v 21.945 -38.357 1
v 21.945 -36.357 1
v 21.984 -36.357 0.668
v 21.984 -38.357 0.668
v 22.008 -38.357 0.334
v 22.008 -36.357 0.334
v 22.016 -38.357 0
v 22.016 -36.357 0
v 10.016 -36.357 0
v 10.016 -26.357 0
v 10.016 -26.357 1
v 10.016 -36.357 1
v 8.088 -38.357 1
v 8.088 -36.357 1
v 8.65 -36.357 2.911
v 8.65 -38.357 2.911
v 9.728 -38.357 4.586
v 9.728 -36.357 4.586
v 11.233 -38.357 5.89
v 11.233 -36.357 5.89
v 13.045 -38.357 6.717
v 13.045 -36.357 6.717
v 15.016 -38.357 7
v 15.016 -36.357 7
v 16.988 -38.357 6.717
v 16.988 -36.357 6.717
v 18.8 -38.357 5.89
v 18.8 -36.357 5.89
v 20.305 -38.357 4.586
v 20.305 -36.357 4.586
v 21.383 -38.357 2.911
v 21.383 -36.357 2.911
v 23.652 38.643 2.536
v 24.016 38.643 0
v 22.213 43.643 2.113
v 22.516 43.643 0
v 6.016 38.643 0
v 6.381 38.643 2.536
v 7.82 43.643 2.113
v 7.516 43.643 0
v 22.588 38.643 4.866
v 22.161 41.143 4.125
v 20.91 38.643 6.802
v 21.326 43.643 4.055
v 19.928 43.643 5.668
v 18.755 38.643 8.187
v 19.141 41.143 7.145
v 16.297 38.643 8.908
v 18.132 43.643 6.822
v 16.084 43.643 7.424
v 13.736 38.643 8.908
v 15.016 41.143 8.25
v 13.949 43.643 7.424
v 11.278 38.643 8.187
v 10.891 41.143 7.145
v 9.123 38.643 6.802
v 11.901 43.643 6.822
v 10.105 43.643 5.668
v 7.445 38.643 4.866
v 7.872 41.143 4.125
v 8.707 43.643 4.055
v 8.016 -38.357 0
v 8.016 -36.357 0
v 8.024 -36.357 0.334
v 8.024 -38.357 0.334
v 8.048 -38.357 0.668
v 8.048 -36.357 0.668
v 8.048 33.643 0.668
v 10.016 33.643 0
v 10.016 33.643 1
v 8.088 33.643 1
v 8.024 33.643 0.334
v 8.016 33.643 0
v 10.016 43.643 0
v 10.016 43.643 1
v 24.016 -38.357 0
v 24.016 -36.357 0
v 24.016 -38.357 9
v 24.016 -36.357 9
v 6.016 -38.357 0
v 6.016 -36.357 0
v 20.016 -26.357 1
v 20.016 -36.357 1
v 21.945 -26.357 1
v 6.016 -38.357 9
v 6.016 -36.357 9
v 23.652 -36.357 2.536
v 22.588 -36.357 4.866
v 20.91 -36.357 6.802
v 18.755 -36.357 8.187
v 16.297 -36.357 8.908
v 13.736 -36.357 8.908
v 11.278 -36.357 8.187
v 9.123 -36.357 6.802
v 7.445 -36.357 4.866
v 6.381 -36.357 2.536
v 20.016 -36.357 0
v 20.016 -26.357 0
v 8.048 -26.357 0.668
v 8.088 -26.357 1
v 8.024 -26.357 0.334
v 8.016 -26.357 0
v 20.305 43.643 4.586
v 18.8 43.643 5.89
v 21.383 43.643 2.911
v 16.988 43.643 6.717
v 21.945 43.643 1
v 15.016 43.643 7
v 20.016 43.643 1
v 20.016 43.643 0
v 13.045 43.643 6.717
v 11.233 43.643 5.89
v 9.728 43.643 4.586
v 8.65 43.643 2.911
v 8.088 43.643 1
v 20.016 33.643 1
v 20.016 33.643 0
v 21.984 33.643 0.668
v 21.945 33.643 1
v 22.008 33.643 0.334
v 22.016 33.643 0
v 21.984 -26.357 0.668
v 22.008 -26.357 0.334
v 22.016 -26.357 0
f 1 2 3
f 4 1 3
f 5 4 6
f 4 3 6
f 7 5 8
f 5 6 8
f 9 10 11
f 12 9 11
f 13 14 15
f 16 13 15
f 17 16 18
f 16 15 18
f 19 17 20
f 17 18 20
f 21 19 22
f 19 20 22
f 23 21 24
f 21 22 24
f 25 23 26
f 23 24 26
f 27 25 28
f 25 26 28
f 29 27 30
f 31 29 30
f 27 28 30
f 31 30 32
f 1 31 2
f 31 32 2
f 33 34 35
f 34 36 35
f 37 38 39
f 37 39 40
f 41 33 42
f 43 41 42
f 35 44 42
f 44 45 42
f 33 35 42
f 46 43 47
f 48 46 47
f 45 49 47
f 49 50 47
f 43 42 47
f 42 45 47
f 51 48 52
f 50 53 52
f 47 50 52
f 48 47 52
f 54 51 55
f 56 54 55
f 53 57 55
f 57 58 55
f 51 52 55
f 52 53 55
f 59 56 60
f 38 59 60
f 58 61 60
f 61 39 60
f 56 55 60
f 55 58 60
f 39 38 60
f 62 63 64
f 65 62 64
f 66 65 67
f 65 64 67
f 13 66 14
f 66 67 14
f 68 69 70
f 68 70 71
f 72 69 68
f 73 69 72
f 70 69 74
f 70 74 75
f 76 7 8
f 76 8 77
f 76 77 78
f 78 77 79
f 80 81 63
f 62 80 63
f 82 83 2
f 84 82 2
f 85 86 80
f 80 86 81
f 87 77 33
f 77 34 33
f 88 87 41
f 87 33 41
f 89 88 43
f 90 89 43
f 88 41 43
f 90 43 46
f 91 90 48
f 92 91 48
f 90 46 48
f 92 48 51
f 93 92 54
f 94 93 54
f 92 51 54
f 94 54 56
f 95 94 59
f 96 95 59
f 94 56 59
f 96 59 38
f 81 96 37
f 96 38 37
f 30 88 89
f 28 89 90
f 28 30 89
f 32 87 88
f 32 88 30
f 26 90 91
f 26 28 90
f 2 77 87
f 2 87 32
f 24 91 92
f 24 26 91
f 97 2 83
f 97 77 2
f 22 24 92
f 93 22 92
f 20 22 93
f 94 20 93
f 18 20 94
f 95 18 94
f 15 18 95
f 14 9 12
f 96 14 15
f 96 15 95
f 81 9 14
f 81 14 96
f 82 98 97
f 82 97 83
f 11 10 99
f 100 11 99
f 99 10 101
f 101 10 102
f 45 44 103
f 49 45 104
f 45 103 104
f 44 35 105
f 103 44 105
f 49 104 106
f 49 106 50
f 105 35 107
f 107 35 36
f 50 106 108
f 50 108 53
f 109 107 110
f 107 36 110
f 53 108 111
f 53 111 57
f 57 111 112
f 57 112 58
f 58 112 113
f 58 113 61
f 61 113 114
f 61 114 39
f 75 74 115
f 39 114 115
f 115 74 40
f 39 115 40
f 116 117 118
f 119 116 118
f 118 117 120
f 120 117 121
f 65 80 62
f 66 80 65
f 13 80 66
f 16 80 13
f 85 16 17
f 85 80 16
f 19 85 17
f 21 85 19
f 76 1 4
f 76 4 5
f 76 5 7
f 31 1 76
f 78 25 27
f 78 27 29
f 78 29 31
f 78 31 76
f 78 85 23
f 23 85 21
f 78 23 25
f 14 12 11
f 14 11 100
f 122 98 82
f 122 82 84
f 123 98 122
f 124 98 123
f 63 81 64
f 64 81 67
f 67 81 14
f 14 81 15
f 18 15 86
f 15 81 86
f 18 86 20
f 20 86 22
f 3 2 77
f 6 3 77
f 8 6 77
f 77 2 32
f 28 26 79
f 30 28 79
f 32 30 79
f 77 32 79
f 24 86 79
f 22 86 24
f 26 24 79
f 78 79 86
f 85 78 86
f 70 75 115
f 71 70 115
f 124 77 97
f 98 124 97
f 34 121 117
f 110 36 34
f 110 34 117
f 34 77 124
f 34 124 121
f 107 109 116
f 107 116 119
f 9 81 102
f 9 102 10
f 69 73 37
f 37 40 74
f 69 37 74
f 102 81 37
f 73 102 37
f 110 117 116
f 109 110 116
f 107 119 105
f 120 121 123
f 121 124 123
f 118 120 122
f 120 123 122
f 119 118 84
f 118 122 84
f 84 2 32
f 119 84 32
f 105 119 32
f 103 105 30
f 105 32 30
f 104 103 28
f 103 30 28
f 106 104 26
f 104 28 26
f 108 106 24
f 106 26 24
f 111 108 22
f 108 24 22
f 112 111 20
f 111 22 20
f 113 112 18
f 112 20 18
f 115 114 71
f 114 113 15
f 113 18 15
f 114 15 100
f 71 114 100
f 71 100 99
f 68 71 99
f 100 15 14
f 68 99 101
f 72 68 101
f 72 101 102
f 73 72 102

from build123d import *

# Parameters (mm, degrees)
REVOLVE_1_ANGLE                           = 180
EXTRUDE_START                             = -10
EXTRUDE_2_DEPTH                           = 10
MIRROR_START                              = -10
MIRROR_1_AT_THE_SECOND_PLANE_COPY_1_DEPTH = 10
EXTRUDE_3_DEPTH                           = 2


with BuildPart() as part:
    # 草图1 → 旋转1 (revolve)
    with BuildSketch(Plane.XY):
        Polygon((24.016399615, 38.642830462), (22.516399615, 43.642830462), (22.016399615, 43.642830462), (22.016399615, -36.357169538), (24.016399615, -36.357169538), align=None)
    revolve(axis=Axis((15.016399615, 43.642830462, 0), (0, -1, 0)), revolution_arc=REVOLVE_1_ANGLE)

    # 草图2 → 凸台-拉伸2 (add)
    with BuildSketch(Plane(origin=(0, 43.642830462, 0), x_dir=(1, 0, 0), z_dir=(0, 1, 0)).offset(EXTRUDE_START)):
        with BuildLine():
            ThreePointArc((21.944602846, -1), (21.998427351, -0.501287038), (22.016399615, 0))
            Line((22.016399615, 0), (20.016399615, 0))
            Line((20.016399615, 0), (20.016399615, -1))
            Line((20.016399615, -1), (21.944602846, -1))
        make_face()
    extrude_2 = extrude(amount=EXTRUDE_2_DEPTH)

    # 镜向1: 凸台-拉伸2 across plane
    add(extrude_2.mirror(Plane.ZX.offset(3.642830462)))

    # 镜向1 at the second plane: 凸台-拉伸2 across plane
    add(extrude_2.mirror(Plane(origin=(15.016399615, 0, 0), x_dir=(0, 0, 1), z_dir=(1, 0, 0))))

    # 镜向1 at the second plane copy 1 sket → 镜向1 at the second plane copy 1 (add)
    with BuildSketch(Plane(origin=(30.032799231, -36.357169538, 0), x_dir=(-1, 0, 0), z_dir=(0, -1, 0)).offset(MIRROR_START)):
        with BuildLine():
            ThreePointArc((21.944602846, -1), (21.998427351, -0.501287038), (22.016399615, 0))
            Line((22.016399615, 0), (20.016399615, 0))
            Line((20.016399615, 0), (20.016399615, -1))
            Line((20.016399615, -1), (21.944602846, -1))
        make_face()
    extrude(amount=MIRROR_1_AT_THE_SECOND_PLANE_COPY_1_DEPTH)


with BuildPart() as body_2:
    # 草图3 → 凸台-拉伸3 (new body)
    with BuildSketch(Plane.XZ.offset(36.357169538)):
        with BuildLine():
            Line((24.016399615, 9), (6.016399615, 9))
            Line((6.016399615, 9), (6.016399615, 0))
            Line((6.016399615, 0), (8.016399615, 0))
            ThreePointArc((8.016399615, 0), (15.016399615, 7), (22.016399615, 0))
            Line((22.016399615, 0), (24.016399615, 0))
            Line((24.016399615, 0), (24.016399615, 9))
        make_face()
    extrude(amount=EXTRUDE_3_DEPTH)


solid = Compound([part.part, body_2.part])
